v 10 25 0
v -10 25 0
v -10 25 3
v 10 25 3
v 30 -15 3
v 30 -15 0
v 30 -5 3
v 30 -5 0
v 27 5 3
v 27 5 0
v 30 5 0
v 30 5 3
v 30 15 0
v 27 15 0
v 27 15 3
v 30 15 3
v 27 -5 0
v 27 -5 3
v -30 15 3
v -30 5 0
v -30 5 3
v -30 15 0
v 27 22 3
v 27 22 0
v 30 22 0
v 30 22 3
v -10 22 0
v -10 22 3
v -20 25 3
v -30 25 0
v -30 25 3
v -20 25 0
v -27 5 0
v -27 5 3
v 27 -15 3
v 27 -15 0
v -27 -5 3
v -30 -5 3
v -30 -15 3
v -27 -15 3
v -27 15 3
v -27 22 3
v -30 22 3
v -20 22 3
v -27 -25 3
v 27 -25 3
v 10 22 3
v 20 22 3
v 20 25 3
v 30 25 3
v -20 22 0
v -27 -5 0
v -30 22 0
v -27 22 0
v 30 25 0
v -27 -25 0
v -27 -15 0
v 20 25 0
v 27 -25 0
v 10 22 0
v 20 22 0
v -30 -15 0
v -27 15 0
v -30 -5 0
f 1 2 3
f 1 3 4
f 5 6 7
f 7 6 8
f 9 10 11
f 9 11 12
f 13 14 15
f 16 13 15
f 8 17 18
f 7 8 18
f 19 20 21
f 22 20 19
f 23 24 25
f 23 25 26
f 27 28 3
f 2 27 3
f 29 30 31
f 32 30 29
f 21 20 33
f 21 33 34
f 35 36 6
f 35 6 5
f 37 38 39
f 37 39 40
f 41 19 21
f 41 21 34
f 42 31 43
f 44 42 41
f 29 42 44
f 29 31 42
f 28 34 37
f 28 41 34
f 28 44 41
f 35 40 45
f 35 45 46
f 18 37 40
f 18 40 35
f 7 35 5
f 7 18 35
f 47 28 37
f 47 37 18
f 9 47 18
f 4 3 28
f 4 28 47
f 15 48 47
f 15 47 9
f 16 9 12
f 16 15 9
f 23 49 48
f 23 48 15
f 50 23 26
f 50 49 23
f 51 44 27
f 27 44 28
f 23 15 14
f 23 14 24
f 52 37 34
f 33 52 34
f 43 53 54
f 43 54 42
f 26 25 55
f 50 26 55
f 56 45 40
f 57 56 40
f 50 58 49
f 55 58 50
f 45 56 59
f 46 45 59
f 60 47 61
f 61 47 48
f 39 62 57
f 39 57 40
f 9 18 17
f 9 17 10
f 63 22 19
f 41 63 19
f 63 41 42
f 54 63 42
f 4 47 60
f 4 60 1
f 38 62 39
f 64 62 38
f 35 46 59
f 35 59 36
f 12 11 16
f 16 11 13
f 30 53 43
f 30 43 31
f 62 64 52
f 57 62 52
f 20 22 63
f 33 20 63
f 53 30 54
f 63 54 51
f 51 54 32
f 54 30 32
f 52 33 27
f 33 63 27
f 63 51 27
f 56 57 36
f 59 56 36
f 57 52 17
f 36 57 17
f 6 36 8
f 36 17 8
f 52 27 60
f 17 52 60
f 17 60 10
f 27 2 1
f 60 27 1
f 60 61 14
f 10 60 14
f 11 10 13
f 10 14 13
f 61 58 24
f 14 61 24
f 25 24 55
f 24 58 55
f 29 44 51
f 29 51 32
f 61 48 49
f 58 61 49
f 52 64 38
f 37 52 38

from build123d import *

# Parameters (mm, degrees)
SKETCH1_W             = 60
SKETCH1_H             = 50
BOSS_EXTRUDE1_DEPTH   = 3
SKETCH2_W             = 10
SKETCH2_H             = 3
CUT_EXTRUDE1_DEPTH    = 3
CAVITY3_START         = -30
CAVITY3_OUTLINE_W     = 7
CAVITY3_OUTLINE_H     = 3
CAVITY3_OUTLINE_W_2   = 10
CAVITY3_DEPTH         = 3
CAVITY3_START_2       = 27
CAVITY3_2_OUTLINE_W   = 7
CAVITY3_2_OUTLINE_H   = 3
CAVITY3_2_OUTLINE_W_2 = 10
CAVITY3_2_DEPTH       = 3


# Read off the part's stored shape, not the designer's step: Cavity3
with BuildPart() as part:
    # Sketch1 → Boss-Extrude1 (new body)
    with BuildSketch(Plane.XY):
        Rectangle(SKETCH1_W, SKETCH1_H)
    extrude(amount=BOSS_EXTRUDE1_DEPTH)

    # Sketch2 → Cut-Extrude1 (cut)
    with BuildSketch(Plane.XY.offset(3)):
        with Locations((-15, 23.5)):
            Rectangle(SKETCH2_W, SKETCH2_H)
        with Locations((15, 23.5)):
            Rectangle(SKETCH2_W, SKETCH2_H)
    extrude(amount=-CUT_EXTRUDE1_DEPTH, mode=Mode.SUBTRACT)

    # Cavity3 outline → Cavity3 (cut)
    with BuildSketch(Plane.YZ.offset(CAVITY3_START)):
        with Locations((18.5, 1.5)):
            Rectangle(CAVITY3_OUTLINE_W, CAVITY3_OUTLINE_H)
        with Locations((0, 1.5)):
            Rectangle(CAVITY3_OUTLINE_W_2, CAVITY3_OUTLINE_H)
        with Locations((-20, 1.5)):
            Rectangle(CAVITY3_OUTLINE_W_2, CAVITY3_OUTLINE_H)
    extrude(amount=CAVITY3_DEPTH, mode=Mode.SUBTRACT)

    # Cavity3 2 outline → Cavity3 2 (cut)
    with BuildSketch(Plane.YZ.offset(CAVITY3_START_2)):
        with Locations((18.5, 1.5)):
            Rectangle(CAVITY3_2_OUTLINE_W, CAVITY3_2_OUTLINE_H)
        with Locations((0, 1.5)):
            Rectangle(CAVITY3_2_OUTLINE_W_2, CAVITY3_2_OUTLINE_H)
        with Locations((-20, 1.5)):
            Rectangle(CAVITY3_2_OUTLINE_W_2, CAVITY3_2_OUTLINE_H)
    extrude(amount=CAVITY3_2_DEPTH, mode=Mode.SUBTRACT)


solid = part.part
